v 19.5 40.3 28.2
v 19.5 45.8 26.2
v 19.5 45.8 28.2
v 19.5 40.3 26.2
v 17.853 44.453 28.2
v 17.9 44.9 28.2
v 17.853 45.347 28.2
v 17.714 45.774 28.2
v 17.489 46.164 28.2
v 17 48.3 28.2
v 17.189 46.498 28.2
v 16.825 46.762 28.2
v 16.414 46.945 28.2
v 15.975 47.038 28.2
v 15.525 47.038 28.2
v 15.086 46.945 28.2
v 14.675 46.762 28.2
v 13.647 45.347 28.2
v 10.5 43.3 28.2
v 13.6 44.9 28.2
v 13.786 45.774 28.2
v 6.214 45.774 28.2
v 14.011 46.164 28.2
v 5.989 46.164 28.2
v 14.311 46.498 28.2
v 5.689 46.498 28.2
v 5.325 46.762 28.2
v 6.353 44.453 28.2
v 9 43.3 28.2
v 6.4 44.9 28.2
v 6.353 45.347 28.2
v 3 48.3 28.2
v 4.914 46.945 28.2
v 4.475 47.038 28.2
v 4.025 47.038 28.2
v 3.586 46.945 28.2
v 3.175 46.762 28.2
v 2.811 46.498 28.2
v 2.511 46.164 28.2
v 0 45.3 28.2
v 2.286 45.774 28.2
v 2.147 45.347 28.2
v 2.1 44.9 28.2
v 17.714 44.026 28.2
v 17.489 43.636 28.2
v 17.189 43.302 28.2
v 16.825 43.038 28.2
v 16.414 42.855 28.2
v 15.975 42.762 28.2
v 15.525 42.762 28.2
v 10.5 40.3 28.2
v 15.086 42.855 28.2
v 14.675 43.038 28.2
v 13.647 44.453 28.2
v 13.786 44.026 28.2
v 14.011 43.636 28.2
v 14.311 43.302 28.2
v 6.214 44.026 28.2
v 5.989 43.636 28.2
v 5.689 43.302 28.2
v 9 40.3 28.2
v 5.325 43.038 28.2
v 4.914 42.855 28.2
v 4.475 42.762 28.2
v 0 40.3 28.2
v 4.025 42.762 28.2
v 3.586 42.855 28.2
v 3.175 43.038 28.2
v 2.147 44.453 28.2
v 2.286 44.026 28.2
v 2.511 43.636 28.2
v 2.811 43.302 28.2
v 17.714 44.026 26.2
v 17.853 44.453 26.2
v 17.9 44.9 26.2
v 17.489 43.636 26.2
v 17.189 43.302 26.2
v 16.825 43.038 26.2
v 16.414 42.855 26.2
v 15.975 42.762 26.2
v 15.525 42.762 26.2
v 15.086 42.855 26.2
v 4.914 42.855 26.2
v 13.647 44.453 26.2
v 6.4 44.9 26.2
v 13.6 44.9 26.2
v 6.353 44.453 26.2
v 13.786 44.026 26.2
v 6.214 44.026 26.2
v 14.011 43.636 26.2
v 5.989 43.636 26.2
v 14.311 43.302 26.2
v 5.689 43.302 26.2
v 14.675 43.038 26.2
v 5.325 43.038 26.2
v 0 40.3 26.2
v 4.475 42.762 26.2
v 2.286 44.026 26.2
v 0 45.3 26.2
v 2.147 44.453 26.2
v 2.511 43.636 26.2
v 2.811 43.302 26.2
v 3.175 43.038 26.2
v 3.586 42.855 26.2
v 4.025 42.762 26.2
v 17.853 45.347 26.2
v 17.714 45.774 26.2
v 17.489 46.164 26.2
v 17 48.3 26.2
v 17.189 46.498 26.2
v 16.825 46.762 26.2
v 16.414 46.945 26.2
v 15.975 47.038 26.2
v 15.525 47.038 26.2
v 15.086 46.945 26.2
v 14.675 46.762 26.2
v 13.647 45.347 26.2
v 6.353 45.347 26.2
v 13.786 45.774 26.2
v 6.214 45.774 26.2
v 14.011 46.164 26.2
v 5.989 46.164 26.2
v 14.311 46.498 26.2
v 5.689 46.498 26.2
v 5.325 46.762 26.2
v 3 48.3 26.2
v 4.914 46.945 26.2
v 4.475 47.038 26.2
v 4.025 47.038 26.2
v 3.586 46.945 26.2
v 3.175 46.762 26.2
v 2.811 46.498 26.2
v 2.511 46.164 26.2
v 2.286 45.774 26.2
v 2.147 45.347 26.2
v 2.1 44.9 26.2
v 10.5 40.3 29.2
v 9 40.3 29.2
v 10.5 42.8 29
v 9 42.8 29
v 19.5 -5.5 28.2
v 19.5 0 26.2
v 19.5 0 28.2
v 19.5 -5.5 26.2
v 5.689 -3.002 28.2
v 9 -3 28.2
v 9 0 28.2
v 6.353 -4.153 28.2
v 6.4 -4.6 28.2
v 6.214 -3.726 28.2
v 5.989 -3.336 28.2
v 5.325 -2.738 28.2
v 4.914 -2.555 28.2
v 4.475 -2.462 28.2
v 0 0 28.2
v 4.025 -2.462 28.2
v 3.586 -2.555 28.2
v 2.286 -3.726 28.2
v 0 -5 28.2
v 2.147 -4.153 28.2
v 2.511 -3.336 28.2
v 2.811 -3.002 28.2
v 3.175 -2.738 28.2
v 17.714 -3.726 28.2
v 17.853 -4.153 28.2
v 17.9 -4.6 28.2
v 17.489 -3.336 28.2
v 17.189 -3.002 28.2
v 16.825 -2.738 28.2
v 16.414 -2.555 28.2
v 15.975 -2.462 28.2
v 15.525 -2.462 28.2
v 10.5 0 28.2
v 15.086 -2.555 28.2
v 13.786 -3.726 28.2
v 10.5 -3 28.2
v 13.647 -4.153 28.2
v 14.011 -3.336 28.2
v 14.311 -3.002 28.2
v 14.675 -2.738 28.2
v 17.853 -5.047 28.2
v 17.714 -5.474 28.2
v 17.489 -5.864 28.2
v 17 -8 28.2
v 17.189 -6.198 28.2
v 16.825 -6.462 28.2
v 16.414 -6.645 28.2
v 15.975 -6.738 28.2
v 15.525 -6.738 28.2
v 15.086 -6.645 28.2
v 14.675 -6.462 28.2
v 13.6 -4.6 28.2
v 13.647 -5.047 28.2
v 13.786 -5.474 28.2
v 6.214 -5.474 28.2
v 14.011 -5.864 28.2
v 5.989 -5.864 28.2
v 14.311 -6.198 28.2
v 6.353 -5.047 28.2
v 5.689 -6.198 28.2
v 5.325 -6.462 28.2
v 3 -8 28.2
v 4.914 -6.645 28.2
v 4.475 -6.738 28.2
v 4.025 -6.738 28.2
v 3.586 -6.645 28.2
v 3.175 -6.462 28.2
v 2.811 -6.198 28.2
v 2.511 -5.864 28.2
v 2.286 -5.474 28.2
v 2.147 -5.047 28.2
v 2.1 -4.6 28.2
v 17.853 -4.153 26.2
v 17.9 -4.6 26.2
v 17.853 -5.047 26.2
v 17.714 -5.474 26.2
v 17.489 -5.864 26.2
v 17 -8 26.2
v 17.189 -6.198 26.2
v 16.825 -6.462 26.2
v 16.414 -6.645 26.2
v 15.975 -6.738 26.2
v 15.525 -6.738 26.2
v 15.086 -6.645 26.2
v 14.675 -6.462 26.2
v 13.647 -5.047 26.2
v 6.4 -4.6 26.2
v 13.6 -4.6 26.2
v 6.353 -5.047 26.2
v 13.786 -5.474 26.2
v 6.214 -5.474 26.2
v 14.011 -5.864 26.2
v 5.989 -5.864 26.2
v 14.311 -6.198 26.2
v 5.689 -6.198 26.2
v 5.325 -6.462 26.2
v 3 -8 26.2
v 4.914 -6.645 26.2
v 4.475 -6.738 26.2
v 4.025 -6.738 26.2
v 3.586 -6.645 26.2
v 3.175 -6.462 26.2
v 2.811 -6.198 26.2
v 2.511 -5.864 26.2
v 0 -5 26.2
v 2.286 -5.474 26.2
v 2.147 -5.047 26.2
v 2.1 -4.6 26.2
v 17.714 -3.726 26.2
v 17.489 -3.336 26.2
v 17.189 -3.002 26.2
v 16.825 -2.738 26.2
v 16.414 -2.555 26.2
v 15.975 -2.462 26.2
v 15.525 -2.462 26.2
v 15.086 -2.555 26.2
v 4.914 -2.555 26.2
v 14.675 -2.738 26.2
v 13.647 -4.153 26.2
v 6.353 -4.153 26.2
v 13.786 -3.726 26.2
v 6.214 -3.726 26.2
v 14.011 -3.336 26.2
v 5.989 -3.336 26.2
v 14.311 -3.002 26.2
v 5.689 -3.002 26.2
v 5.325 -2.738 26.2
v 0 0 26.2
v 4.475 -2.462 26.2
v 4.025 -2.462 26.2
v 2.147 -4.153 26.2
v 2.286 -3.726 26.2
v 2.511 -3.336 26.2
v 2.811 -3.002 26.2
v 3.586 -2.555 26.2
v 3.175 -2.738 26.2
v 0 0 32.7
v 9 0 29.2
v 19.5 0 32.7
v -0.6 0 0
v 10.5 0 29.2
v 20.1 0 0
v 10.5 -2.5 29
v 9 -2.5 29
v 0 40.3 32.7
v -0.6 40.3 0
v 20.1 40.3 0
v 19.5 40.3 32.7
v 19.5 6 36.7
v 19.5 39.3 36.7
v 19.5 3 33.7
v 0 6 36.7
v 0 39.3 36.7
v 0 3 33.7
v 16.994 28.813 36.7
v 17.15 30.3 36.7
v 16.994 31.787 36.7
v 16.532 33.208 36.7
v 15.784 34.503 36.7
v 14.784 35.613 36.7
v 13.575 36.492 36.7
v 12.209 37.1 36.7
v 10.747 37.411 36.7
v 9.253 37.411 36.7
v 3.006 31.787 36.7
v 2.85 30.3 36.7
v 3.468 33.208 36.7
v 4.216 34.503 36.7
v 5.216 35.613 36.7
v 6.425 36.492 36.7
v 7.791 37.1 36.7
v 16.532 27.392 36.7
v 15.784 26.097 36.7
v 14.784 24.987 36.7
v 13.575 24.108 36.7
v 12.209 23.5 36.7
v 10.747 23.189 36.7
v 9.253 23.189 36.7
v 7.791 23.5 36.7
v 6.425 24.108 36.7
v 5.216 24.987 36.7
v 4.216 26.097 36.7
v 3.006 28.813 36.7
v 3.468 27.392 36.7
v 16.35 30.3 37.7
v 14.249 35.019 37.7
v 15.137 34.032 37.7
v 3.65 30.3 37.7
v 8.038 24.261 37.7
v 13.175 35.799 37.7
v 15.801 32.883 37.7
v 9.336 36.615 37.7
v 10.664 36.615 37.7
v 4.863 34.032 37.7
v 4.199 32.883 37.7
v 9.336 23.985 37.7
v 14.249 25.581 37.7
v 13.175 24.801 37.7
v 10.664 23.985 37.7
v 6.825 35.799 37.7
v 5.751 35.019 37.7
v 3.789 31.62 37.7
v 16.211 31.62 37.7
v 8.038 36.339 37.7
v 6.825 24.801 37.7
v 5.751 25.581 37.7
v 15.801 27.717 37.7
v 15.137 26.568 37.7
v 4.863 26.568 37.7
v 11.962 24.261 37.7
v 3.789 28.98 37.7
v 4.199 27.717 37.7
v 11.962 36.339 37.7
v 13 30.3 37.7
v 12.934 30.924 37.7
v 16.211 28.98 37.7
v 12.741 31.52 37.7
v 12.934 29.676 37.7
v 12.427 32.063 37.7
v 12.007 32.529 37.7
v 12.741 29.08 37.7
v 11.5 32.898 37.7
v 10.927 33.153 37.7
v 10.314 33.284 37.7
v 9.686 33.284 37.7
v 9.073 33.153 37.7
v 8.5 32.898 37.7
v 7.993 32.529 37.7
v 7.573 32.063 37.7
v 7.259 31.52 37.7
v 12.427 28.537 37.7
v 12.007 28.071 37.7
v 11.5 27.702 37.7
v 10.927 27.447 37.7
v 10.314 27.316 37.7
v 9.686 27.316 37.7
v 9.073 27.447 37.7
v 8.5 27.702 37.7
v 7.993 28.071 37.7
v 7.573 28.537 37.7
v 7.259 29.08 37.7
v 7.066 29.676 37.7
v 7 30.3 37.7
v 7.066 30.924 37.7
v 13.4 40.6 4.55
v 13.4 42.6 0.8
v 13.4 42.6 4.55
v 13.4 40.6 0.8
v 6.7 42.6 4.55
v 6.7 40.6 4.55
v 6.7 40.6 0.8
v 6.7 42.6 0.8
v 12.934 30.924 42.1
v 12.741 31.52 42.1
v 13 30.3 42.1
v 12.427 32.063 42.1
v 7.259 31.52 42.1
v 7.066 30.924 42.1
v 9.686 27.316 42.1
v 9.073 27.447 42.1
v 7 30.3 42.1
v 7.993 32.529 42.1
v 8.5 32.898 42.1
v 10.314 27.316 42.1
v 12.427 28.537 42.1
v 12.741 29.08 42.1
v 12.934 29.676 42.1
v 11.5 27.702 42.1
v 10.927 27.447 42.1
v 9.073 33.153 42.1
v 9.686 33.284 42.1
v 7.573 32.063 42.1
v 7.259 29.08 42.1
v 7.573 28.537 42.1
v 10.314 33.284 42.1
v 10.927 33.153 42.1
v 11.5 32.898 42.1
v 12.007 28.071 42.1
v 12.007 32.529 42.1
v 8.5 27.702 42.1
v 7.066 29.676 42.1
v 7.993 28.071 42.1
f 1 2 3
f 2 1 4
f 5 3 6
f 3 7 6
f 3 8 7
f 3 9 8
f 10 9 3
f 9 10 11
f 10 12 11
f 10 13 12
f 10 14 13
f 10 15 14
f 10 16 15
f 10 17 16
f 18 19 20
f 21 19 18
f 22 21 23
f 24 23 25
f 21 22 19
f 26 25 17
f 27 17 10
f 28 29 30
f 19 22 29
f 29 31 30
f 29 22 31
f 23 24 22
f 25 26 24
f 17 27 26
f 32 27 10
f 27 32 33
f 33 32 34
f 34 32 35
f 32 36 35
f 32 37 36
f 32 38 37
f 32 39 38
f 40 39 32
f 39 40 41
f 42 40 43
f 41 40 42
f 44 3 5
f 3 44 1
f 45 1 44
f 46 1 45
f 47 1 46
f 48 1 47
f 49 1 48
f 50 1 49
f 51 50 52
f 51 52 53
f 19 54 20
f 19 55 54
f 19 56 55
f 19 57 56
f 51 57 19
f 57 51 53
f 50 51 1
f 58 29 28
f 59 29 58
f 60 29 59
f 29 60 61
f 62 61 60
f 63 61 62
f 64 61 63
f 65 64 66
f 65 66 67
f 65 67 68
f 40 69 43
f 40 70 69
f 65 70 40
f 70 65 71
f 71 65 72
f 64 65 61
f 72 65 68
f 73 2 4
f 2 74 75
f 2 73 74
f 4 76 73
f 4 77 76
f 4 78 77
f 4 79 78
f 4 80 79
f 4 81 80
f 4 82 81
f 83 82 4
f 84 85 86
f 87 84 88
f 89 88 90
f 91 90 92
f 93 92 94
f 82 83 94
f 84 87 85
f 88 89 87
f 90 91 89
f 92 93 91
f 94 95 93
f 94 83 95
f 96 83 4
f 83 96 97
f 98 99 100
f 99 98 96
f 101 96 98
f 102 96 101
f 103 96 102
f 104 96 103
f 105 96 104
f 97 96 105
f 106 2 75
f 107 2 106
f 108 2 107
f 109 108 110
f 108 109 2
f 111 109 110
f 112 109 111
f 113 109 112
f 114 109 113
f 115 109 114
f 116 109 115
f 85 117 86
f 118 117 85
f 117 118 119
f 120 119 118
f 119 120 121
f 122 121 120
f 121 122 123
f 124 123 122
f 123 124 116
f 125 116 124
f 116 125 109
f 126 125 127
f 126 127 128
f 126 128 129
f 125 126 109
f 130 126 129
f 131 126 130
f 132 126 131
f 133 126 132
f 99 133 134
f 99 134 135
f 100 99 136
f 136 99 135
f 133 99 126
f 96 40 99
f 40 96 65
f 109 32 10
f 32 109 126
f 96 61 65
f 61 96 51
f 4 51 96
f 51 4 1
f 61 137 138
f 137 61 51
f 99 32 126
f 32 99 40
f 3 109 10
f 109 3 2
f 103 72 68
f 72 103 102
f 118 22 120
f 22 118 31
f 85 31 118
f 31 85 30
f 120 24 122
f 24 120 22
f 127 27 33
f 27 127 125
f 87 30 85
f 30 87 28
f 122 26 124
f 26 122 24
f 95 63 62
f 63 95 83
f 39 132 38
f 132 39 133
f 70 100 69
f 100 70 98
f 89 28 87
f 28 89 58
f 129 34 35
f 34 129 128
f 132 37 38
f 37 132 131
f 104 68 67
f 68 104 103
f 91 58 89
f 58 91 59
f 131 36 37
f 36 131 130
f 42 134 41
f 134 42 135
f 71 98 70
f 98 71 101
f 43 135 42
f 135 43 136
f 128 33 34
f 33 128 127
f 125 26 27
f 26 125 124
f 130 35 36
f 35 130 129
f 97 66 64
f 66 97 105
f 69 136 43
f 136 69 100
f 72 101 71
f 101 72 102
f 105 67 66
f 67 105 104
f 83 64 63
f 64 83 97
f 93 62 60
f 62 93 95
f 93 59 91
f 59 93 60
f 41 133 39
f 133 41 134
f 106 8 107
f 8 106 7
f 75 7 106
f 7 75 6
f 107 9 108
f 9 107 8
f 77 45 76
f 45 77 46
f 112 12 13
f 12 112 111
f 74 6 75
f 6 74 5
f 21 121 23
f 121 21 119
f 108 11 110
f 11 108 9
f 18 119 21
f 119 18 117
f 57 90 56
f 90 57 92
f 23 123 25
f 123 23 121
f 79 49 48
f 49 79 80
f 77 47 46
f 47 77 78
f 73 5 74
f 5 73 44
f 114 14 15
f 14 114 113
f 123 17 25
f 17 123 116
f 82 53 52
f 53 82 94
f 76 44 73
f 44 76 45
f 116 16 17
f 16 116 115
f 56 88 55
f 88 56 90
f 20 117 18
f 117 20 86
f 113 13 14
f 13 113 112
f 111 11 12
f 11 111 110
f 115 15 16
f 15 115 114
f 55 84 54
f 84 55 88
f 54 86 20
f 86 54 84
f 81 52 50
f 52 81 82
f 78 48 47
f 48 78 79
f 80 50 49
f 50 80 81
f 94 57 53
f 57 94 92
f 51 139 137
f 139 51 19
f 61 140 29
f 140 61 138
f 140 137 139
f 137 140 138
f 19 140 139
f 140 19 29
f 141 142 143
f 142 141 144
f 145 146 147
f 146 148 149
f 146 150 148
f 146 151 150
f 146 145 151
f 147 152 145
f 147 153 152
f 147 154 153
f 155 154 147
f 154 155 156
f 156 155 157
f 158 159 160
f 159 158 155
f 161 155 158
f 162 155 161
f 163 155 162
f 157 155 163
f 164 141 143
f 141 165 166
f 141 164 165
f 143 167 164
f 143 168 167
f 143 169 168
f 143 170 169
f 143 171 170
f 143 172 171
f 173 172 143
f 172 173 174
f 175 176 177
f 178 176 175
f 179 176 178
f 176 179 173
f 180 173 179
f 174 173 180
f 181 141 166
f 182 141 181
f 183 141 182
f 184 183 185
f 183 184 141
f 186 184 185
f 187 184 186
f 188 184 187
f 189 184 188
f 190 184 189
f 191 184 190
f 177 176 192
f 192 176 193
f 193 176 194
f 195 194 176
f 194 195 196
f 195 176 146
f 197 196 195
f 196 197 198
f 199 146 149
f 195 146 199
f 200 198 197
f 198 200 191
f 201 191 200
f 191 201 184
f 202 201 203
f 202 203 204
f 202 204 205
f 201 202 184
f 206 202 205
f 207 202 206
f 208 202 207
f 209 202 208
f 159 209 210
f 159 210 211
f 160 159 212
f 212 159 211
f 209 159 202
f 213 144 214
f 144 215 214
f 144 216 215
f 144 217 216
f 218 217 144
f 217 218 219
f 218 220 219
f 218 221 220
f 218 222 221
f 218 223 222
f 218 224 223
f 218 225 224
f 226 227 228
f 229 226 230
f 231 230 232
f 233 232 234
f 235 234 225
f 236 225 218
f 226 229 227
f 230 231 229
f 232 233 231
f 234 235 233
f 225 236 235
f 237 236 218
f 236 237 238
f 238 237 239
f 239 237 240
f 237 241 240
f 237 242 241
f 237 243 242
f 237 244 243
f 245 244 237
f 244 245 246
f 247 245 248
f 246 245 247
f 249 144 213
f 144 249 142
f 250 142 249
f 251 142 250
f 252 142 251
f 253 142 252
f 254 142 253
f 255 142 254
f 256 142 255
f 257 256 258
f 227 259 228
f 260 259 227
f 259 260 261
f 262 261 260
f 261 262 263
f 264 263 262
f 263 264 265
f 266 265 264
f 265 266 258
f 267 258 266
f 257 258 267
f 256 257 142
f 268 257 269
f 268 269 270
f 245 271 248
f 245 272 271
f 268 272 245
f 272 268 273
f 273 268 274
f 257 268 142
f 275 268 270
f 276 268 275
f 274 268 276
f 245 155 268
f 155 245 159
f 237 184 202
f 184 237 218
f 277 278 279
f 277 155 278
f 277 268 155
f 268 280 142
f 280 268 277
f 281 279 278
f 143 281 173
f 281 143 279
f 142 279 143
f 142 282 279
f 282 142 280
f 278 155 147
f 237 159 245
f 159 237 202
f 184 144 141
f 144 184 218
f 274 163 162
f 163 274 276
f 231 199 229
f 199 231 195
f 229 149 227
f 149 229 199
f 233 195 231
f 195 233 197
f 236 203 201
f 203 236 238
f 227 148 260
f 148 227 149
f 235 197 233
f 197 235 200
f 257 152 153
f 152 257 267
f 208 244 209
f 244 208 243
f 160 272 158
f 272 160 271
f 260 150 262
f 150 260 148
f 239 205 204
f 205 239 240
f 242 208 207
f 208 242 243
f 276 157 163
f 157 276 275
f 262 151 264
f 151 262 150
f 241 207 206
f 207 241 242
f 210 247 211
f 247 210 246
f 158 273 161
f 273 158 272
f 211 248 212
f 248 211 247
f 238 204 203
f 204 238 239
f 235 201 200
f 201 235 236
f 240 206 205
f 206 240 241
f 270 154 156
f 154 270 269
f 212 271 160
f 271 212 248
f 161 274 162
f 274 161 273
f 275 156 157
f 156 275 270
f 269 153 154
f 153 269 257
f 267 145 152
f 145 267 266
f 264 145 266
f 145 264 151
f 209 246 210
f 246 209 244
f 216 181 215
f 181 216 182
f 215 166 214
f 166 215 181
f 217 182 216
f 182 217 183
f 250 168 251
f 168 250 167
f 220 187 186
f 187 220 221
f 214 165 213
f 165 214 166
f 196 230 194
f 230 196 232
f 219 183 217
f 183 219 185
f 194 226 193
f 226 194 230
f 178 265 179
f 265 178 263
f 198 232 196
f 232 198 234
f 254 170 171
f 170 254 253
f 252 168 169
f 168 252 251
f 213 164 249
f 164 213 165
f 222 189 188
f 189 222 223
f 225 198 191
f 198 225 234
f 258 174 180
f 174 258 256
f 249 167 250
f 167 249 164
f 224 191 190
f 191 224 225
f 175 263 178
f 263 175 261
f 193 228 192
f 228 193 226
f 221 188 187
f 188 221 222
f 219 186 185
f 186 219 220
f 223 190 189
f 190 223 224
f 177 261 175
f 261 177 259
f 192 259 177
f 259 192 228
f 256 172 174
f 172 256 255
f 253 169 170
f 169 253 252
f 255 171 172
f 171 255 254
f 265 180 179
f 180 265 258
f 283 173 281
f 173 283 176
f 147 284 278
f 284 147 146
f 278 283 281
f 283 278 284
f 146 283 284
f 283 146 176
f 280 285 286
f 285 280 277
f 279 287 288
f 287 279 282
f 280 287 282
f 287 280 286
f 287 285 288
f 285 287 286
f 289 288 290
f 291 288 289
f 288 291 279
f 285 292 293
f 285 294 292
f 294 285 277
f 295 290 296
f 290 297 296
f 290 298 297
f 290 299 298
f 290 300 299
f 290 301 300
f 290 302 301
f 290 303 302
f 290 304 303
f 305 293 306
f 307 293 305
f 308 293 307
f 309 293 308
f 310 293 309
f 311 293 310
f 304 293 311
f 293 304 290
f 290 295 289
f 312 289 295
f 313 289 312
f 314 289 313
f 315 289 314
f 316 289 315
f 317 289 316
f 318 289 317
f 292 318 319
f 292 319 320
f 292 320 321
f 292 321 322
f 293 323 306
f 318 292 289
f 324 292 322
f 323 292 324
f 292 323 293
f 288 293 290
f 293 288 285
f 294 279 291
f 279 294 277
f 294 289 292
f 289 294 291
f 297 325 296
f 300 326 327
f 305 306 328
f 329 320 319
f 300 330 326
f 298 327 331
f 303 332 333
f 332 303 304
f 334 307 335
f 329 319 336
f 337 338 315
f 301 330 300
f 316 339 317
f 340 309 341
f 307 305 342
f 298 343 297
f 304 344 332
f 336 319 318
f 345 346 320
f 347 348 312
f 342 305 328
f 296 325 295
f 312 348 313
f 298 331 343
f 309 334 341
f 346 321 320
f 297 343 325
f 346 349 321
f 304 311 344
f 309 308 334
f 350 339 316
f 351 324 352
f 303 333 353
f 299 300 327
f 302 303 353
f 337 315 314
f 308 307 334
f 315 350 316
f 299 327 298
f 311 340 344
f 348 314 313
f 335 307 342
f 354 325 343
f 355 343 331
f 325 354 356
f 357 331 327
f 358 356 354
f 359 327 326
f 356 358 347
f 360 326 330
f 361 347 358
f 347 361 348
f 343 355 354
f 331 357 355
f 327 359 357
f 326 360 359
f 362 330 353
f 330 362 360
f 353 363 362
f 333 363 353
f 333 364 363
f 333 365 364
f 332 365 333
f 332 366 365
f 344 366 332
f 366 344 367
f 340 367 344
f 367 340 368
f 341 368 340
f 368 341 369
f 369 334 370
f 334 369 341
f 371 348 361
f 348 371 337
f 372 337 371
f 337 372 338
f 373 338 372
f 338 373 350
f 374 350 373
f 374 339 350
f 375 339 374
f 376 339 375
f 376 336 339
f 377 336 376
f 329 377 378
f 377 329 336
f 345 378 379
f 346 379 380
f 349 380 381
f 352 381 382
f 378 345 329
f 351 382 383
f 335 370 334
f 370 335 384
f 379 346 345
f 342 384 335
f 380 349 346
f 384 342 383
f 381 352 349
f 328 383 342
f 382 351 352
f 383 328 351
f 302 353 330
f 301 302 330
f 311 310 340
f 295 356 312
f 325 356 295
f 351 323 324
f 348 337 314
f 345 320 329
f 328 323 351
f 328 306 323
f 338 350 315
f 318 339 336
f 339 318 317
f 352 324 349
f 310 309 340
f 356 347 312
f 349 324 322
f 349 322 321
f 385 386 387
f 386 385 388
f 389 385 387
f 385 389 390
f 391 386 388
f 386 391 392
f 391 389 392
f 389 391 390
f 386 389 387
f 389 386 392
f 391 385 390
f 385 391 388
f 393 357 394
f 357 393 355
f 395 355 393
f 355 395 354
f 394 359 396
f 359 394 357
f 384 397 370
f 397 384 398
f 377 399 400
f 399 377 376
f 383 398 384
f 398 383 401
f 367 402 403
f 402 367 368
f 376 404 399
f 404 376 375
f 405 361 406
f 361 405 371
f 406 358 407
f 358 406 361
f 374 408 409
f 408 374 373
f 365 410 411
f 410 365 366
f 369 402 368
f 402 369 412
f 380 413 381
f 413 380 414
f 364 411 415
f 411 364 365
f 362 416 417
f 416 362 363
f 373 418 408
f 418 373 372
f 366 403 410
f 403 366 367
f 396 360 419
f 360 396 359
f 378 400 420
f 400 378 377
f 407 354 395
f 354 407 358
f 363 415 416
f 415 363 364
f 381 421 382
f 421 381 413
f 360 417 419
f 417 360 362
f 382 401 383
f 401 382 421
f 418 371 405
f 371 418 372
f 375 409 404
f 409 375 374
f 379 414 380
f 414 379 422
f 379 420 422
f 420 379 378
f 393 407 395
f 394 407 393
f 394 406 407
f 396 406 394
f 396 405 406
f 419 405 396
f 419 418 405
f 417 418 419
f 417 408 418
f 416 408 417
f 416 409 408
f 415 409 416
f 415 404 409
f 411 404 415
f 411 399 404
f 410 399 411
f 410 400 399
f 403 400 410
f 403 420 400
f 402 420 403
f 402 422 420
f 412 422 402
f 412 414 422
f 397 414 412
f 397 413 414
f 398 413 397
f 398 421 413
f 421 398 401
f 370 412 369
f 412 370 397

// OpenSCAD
//
// Modelcraft RS 2 Servo
//

// Set the length of segments in a cylinder to have a decent resolution
$fs=0.3;

RenderServo();

// A wedge made from a polyhedron
module wedge(width, length, height)
{
	polyhedron(
		points=[ 
			[0, 0, 0], [0, length, 0], [0, length, height],
			[width, 0, 0], [width, length, 0], [width, length, height] 
			],
		triangles= [ 
			[0, 1, 2], 
			[3, 5, 4], 
			[1, 4, 2], 
			[4, 5, 2],
			[0, 3, 4],
			[0, 4, 1],
			[0, 2, 5],
			[0, 5, 3]
			] );
}

// A wedge made from a polyhedron
module wedge2(width1, width2, length, height)
{

}

module body(width1, width2, length, height)
{
	extraWidth = width2 - width1;
	polyhedron(
		points=[ 
			[-extraWidth, 0, 0], [-extraWidth, length, 0], [0, length, height],
			[width2, 0, 0], [width2, length, 0], [width1, length, height],
			[0, 0, height], [width1, 0, height]
			],
		triangles= [ 
			[0, 1, 2], 
			[3, 5, 4], 
			[1, 4, 2], 
			[4, 5, 2],
			[0, 3, 4],
			[0, 4, 1],
			[0, 6, 7],
			[3, 0, 7],
			[0, 2, 6],
			[3, 7, 5],
			[6, 5, 7],
			[6, 2, 5],
			] );}

// A mount point on one side of the servo
module mount()
{
	difference()
	{
		cube([19.5, 8, 2]);
		translate([0, 5, -1]) rotate([0, 0, 45]) cube([19.5, 8, 4]);
		translate([17, 8, -1]) rotate([0, 0, -45]) cube([19.5, 8, 4]);
		translate([4.25, 4.6, -1]) cylinder(r=2.15, h=4);
		translate([15.75, 4.6, -1]) cylinder(r=2.15, h=4);
	}
	translate([9.0, 0, 2]) cube([1.5, 2.5, 0.8]);
	translate([9.0, 2.5, 2.8]) mirror([0, 1, 0]) wedge(1.5, 2.5, 0.2);
	translate([9.0, 3, 2]) mirror([0, 1, 0]) wedge(1.5, 0.5, 0.8);
}


module RenderServo()
{
color("darkslategray")
{

// Left mount
translate([0, 40.3, 26.2]) mount();

// Right mount
translate([0, 0, 26.2]) mirror([0, 1, 0]) mount();

// Main body
//cube([19.5, 40.3, 32.7]);
body(19.5, 20.1, 40.3, 32.7);

// Upper body parts
translate([0, 3, 32.7]) cube([19.5, 36.4, 1]);
translate([0, 6, 33.7]) cube([19.5, 33.3, 3]);

// Wedges in the upper body part
translate([0, 40.3, 32.7]) mirror([0, 1, 0]) wedge(19.5, 1.0, 4);
translate([0, 0, 32.7]) wedge(19.5, 3.0, 1);
translate([0, 3, 33.7]) wedge(19.5, 3.0, 3);

// Ring around shaft
translate([10, 30.3, 36.7]) cylinder(r1=7.15, r2=6.35, h=1);

// Cable outlet
translate([6.7, 40.6, 0.8]) cube([6.7, 2, 3.75]);


}

// Shaft
color("white") translate([10, 30.3, 36.7]) cylinder(r=3, h=5.4);
}
